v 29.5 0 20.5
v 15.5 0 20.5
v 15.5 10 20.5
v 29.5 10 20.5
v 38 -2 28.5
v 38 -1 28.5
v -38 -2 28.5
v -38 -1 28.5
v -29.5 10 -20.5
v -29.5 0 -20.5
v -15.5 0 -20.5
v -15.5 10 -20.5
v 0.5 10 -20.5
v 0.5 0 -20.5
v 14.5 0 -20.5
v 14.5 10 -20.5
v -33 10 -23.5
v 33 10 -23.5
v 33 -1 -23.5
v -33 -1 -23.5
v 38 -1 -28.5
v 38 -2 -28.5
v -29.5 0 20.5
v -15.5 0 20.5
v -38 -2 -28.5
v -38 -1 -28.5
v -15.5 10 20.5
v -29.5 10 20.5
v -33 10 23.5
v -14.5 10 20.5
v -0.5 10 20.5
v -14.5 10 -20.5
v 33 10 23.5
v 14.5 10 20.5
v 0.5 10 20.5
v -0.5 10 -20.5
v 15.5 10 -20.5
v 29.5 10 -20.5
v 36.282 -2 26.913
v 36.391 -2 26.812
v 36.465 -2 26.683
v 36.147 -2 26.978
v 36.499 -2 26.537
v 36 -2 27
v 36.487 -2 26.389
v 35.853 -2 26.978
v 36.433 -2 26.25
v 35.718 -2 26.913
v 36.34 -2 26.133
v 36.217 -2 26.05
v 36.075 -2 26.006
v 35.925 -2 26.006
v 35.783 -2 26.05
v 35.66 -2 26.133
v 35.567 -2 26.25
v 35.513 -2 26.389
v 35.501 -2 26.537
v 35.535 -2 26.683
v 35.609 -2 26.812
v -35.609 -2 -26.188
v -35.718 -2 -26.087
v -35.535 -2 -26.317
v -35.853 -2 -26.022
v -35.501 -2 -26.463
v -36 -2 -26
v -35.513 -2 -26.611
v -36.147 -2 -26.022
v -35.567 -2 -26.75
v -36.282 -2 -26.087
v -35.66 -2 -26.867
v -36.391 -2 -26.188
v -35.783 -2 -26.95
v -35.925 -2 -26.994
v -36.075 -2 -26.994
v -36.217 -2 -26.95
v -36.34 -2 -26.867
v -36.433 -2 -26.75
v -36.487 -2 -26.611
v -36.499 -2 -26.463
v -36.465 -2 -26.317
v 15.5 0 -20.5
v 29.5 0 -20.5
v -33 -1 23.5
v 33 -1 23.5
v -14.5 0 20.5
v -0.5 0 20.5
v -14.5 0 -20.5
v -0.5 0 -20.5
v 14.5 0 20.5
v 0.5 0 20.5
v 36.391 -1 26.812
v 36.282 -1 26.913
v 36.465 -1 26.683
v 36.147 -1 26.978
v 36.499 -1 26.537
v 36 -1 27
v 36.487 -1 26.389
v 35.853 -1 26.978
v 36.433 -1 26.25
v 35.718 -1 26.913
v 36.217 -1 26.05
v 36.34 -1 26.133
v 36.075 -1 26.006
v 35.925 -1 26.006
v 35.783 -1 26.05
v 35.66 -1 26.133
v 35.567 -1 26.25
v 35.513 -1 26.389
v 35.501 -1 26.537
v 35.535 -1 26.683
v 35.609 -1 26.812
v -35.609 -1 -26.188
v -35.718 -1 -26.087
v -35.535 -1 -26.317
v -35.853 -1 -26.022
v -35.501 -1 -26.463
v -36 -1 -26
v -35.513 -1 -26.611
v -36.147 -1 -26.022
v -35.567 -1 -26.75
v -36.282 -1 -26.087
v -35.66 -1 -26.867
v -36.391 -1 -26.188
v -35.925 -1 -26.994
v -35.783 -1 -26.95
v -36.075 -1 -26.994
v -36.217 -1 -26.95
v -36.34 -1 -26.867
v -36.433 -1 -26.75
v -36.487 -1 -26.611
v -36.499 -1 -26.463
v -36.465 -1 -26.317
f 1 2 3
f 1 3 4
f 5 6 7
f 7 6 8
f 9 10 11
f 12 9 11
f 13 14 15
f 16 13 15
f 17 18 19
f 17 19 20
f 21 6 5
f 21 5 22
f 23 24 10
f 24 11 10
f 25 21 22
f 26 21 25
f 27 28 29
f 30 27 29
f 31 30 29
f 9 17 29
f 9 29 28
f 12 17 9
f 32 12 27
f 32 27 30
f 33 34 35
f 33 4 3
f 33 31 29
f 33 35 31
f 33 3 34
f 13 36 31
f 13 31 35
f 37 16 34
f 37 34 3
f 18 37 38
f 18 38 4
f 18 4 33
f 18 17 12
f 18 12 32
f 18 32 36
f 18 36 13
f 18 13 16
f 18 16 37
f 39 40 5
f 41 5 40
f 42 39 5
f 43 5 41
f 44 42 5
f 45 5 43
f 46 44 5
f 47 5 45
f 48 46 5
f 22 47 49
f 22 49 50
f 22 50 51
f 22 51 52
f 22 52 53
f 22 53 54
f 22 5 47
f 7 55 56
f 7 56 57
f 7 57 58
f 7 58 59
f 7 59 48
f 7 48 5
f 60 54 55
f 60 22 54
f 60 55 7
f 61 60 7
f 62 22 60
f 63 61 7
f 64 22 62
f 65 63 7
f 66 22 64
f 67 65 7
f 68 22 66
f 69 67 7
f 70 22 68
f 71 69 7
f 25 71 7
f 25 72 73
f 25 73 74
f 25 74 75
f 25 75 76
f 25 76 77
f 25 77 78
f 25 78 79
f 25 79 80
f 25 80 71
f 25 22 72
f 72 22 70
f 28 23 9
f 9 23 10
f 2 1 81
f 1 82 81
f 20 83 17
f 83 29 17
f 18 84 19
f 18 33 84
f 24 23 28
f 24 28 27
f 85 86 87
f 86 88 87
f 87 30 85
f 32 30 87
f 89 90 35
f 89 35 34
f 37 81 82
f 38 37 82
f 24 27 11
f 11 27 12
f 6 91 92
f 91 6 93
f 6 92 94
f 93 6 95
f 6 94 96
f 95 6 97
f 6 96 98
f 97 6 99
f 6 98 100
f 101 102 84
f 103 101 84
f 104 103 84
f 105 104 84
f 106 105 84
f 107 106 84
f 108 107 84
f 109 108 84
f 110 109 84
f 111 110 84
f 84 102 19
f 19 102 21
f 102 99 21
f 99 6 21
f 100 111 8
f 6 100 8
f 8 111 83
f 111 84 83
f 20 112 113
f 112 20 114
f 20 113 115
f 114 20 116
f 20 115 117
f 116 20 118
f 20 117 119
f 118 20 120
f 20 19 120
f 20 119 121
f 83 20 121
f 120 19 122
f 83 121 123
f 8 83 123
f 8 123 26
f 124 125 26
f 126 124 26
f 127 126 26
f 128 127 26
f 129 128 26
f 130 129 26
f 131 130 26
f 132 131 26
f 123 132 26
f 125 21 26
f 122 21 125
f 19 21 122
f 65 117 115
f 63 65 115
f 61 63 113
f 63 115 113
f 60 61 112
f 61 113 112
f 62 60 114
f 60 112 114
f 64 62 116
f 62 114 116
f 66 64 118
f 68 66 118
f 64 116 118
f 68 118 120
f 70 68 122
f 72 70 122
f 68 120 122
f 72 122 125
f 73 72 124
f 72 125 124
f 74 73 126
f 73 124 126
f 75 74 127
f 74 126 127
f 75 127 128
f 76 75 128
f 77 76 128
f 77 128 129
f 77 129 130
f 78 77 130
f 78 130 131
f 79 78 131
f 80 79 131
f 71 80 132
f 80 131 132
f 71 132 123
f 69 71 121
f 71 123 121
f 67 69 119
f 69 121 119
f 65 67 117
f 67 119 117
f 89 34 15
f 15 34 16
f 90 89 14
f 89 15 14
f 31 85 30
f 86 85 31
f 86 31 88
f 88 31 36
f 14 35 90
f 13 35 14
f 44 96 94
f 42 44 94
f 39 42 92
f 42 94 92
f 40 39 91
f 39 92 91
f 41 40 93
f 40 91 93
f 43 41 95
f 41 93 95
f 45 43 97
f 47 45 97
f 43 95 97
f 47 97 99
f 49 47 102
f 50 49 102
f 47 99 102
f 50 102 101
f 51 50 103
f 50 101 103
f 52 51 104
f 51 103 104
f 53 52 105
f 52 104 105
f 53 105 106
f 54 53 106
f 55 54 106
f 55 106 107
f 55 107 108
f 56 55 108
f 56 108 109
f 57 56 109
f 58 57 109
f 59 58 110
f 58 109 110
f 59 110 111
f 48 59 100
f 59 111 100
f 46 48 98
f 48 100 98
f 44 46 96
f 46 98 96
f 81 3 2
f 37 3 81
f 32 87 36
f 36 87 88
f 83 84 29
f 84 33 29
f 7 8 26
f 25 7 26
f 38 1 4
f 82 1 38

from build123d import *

# Parameters (mm, degrees)
SKETCH1_W           = 66
SKETCH1_H           = 47
SKETCH1_W_2         = 59
SKETCH1_H_2         = 41
BOSS_EXTRUDE1_DEPTH = 10
SKETCH3_W           = 66
SKETCH3_H           = 47
BOSS_EXTRUDE2_DEPTH = 1
SKETCH6_W           = 1
SKETCH6_H           = 41
SKETCH6_W_2         = 0.5
BOSS_EXTRUDE3_DEPTH = 10
SKETCH7_W           = 76
SKETCH7_H           = 57
BOSS_EXTRUDE4_DEPTH = 1
SKETCH8_R           = 0.5
CUT_EXTRUDE1_DEPTH  = 1


with BuildPart() as part:
    # Sketch1 → Boss-Extrude1 (new body)
    with BuildSketch(Plane(origin=(0, 0, 0), x_dir=(1, 0, 0), z_dir=(0, 1, 0))):
        Rectangle(SKETCH1_W, SKETCH1_H)
        Rectangle(SKETCH1_W_2, SKETCH1_H_2, mode=Mode.SUBTRACT)
    extrude(amount=BOSS_EXTRUDE1_DEPTH)

    # Sketch3 → Boss-Extrude2 (add)
    with BuildSketch(Plane(origin=(0, 0, 0), x_dir=(-1, 0, 0), z_dir=(0, -1, 0))):
        Rectangle(SKETCH3_W, SKETCH3_H)
    extrude(amount=BOSS_EXTRUDE2_DEPTH)

    # Sketch6 → Boss-Extrude3 (add)
    with BuildSketch(Plane(origin=(0, 10, 0), x_dir=(1, 0, 0), z_dir=(0, 1, 0))):
        with Locations((-15, 0)):
            Rectangle(SKETCH6_W, SKETCH6_H)
        with Locations((-0.25, 0)):
            Rectangle(SKETCH6_W_2, SKETCH6_H)
        with Locations((0.25, 0)):
            Rectangle(SKETCH6_W_2, SKETCH6_H)
        with Locations((15, 0)):
            Rectangle(SKETCH6_W, SKETCH6_H)
    extrude(amount=-BOSS_EXTRUDE3_DEPTH)

    # Sketch7 → Boss-Extrude4 (add)
    with BuildSketch(Plane(origin=(0, -1, 0), x_dir=(-1, 0, 0), z_dir=(0, -1, 0))):
        Rectangle(SKETCH7_W, SKETCH7_H)
    extrude(amount=BOSS_EXTRUDE4_DEPTH)

    # Sketch8 → Cut-Extrude1 (cut)
    with BuildSketch(Plane(origin=(0, -1, 0), x_dir=(1, 0, 0), z_dir=(0, 1, 0))):
        with Locations(Location((-36, 26.5, 0), (0, 0, 270))):
            Circle(SKETCH8_R)
        with Locations(Location((36, -26.5, 0), (0, 0, 270))):
            Circle(SKETCH8_R)
    extrude(amount=-CUT_EXTRUDE1_DEPTH, mode=Mode.SUBTRACT)


solid = part.part
